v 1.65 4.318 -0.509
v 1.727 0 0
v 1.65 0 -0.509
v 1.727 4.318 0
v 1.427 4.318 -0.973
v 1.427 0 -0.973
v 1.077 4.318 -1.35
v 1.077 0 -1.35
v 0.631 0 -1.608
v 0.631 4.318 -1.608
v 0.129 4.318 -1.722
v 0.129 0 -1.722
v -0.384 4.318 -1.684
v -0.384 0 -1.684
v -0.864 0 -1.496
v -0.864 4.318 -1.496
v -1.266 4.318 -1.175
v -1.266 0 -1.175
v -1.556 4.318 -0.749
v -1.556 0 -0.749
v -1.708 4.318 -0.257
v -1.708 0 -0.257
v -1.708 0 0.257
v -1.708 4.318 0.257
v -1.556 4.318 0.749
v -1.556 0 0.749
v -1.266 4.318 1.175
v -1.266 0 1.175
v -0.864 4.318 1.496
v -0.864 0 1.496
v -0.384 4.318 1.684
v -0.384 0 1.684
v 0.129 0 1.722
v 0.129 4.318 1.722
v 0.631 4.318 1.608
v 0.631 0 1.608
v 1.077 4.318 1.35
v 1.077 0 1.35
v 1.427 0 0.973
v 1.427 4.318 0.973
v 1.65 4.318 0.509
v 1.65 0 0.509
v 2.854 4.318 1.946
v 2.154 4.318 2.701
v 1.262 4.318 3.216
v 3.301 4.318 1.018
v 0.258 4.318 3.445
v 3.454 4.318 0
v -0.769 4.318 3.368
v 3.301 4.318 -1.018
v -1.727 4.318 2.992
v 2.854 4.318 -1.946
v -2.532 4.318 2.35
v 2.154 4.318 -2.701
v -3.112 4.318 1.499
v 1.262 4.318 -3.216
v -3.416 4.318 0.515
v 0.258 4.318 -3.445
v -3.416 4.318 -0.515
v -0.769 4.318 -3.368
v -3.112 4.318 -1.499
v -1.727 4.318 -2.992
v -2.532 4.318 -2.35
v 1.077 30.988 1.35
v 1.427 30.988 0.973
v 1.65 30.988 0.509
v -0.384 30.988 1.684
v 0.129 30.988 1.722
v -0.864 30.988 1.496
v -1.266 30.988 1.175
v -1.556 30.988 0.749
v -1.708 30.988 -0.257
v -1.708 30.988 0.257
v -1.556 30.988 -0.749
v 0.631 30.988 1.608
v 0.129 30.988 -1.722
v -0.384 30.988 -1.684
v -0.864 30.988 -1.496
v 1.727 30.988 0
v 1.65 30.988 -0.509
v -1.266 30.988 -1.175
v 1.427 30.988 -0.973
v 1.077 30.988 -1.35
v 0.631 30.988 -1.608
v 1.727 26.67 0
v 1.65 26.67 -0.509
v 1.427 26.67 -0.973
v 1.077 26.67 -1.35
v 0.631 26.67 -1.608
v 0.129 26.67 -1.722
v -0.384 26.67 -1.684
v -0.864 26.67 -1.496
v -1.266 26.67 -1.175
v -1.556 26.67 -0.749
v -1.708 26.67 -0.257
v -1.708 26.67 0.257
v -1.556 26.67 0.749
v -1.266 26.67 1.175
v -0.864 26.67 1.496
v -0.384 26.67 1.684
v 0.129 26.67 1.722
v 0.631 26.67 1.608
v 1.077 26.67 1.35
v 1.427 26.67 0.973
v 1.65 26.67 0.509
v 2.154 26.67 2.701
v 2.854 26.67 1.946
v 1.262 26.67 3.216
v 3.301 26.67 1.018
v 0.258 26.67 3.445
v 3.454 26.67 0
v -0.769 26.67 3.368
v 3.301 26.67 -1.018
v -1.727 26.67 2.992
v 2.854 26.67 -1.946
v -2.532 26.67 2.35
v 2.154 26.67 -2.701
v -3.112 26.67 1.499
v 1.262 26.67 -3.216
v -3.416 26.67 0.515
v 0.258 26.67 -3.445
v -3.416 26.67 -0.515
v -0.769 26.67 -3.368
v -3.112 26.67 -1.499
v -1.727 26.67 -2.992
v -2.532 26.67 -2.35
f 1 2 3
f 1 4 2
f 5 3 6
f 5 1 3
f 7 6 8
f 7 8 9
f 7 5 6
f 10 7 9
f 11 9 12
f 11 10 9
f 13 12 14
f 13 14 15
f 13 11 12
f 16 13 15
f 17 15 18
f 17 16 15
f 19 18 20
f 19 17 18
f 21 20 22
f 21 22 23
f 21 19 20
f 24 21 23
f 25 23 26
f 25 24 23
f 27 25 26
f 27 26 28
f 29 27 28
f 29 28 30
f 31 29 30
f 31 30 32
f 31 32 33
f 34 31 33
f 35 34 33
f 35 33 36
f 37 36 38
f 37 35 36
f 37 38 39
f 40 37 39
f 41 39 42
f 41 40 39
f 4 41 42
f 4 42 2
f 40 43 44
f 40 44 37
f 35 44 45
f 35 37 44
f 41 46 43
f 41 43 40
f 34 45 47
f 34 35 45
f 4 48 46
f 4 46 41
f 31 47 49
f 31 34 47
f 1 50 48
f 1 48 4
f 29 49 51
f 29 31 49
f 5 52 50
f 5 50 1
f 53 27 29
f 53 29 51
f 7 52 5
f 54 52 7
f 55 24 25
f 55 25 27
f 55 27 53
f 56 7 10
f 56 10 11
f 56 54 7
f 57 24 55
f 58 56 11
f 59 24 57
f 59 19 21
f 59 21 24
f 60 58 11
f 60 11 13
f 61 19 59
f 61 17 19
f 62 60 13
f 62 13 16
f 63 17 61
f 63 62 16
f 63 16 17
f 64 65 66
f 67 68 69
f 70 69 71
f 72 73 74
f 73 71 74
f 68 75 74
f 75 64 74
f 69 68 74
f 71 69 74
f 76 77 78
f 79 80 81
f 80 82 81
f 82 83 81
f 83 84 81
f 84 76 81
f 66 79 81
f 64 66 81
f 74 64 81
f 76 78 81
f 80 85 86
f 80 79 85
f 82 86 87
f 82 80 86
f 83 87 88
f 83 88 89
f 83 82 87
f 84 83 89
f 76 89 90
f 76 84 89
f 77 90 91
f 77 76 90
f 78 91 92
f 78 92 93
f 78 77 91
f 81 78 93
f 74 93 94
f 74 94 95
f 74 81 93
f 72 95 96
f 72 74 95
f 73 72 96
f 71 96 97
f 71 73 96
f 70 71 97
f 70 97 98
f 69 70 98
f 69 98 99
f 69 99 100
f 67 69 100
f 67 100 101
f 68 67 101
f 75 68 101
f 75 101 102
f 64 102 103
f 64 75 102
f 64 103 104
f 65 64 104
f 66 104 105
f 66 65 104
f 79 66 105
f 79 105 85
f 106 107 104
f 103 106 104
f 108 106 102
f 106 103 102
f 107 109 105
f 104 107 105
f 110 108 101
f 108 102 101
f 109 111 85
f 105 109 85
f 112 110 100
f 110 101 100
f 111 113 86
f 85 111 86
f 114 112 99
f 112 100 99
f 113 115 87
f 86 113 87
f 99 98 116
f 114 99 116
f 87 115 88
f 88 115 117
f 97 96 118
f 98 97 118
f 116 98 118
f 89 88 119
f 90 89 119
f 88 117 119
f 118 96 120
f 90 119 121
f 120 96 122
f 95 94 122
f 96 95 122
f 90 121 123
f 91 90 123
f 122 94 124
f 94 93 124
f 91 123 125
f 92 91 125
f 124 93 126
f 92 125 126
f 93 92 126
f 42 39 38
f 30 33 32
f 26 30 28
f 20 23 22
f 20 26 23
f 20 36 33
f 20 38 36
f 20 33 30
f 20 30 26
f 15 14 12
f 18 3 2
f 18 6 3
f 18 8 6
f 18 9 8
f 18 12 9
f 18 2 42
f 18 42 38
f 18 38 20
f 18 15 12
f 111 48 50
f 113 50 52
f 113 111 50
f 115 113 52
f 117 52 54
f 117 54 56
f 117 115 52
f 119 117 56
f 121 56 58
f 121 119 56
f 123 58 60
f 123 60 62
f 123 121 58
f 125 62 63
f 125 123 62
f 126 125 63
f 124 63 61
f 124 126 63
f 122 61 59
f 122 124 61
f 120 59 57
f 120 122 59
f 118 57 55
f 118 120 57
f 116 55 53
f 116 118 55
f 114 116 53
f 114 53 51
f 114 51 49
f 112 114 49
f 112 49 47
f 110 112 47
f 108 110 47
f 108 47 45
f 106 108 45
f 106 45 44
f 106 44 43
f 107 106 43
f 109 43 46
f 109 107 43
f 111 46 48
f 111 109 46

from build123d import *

# Parameters (mm, degrees)
SKETCH1_W = 3.4544
SKETCH1_H = 30.988
SKETCH2_W = 1.7272
SKETCH2_H = 4.318
SKETCH3_W = 1.7272
SKETCH3_H = 4.318


with BuildPart() as part:
    # Sketch1 → Revolve1 (revolve)
    with BuildSketch(Plane.XY):
        with Locations((1.7272, 15.494)):
            Rectangle(SKETCH1_W, SKETCH1_H)
    revolve(axis=Axis((0, 0, 0), (0, 1, 0)))

    # Sketch2 → Cut-Revolve1 (revolve, cut)
    with BuildSketch(Plane.XY):
        with Locations((2.5908, 2.159)):
            Rectangle(SKETCH2_W, SKETCH2_H)
    revolve(axis=Axis((0, 0, 0), (0, 1, 0)), mode=Mode.SUBTRACT)

    # Sketch3 → Cut-Revolve2 (revolve, cut)
    with BuildSketch(Plane.XY):
        with Locations((2.5908, 28.829)):
            Rectangle(SKETCH3_W, SKETCH3_H)
    revolve(axis=Axis((0, 26.67, 0), (0, 1, 0)), mode=Mode.SUBTRACT)


solid = part.part
